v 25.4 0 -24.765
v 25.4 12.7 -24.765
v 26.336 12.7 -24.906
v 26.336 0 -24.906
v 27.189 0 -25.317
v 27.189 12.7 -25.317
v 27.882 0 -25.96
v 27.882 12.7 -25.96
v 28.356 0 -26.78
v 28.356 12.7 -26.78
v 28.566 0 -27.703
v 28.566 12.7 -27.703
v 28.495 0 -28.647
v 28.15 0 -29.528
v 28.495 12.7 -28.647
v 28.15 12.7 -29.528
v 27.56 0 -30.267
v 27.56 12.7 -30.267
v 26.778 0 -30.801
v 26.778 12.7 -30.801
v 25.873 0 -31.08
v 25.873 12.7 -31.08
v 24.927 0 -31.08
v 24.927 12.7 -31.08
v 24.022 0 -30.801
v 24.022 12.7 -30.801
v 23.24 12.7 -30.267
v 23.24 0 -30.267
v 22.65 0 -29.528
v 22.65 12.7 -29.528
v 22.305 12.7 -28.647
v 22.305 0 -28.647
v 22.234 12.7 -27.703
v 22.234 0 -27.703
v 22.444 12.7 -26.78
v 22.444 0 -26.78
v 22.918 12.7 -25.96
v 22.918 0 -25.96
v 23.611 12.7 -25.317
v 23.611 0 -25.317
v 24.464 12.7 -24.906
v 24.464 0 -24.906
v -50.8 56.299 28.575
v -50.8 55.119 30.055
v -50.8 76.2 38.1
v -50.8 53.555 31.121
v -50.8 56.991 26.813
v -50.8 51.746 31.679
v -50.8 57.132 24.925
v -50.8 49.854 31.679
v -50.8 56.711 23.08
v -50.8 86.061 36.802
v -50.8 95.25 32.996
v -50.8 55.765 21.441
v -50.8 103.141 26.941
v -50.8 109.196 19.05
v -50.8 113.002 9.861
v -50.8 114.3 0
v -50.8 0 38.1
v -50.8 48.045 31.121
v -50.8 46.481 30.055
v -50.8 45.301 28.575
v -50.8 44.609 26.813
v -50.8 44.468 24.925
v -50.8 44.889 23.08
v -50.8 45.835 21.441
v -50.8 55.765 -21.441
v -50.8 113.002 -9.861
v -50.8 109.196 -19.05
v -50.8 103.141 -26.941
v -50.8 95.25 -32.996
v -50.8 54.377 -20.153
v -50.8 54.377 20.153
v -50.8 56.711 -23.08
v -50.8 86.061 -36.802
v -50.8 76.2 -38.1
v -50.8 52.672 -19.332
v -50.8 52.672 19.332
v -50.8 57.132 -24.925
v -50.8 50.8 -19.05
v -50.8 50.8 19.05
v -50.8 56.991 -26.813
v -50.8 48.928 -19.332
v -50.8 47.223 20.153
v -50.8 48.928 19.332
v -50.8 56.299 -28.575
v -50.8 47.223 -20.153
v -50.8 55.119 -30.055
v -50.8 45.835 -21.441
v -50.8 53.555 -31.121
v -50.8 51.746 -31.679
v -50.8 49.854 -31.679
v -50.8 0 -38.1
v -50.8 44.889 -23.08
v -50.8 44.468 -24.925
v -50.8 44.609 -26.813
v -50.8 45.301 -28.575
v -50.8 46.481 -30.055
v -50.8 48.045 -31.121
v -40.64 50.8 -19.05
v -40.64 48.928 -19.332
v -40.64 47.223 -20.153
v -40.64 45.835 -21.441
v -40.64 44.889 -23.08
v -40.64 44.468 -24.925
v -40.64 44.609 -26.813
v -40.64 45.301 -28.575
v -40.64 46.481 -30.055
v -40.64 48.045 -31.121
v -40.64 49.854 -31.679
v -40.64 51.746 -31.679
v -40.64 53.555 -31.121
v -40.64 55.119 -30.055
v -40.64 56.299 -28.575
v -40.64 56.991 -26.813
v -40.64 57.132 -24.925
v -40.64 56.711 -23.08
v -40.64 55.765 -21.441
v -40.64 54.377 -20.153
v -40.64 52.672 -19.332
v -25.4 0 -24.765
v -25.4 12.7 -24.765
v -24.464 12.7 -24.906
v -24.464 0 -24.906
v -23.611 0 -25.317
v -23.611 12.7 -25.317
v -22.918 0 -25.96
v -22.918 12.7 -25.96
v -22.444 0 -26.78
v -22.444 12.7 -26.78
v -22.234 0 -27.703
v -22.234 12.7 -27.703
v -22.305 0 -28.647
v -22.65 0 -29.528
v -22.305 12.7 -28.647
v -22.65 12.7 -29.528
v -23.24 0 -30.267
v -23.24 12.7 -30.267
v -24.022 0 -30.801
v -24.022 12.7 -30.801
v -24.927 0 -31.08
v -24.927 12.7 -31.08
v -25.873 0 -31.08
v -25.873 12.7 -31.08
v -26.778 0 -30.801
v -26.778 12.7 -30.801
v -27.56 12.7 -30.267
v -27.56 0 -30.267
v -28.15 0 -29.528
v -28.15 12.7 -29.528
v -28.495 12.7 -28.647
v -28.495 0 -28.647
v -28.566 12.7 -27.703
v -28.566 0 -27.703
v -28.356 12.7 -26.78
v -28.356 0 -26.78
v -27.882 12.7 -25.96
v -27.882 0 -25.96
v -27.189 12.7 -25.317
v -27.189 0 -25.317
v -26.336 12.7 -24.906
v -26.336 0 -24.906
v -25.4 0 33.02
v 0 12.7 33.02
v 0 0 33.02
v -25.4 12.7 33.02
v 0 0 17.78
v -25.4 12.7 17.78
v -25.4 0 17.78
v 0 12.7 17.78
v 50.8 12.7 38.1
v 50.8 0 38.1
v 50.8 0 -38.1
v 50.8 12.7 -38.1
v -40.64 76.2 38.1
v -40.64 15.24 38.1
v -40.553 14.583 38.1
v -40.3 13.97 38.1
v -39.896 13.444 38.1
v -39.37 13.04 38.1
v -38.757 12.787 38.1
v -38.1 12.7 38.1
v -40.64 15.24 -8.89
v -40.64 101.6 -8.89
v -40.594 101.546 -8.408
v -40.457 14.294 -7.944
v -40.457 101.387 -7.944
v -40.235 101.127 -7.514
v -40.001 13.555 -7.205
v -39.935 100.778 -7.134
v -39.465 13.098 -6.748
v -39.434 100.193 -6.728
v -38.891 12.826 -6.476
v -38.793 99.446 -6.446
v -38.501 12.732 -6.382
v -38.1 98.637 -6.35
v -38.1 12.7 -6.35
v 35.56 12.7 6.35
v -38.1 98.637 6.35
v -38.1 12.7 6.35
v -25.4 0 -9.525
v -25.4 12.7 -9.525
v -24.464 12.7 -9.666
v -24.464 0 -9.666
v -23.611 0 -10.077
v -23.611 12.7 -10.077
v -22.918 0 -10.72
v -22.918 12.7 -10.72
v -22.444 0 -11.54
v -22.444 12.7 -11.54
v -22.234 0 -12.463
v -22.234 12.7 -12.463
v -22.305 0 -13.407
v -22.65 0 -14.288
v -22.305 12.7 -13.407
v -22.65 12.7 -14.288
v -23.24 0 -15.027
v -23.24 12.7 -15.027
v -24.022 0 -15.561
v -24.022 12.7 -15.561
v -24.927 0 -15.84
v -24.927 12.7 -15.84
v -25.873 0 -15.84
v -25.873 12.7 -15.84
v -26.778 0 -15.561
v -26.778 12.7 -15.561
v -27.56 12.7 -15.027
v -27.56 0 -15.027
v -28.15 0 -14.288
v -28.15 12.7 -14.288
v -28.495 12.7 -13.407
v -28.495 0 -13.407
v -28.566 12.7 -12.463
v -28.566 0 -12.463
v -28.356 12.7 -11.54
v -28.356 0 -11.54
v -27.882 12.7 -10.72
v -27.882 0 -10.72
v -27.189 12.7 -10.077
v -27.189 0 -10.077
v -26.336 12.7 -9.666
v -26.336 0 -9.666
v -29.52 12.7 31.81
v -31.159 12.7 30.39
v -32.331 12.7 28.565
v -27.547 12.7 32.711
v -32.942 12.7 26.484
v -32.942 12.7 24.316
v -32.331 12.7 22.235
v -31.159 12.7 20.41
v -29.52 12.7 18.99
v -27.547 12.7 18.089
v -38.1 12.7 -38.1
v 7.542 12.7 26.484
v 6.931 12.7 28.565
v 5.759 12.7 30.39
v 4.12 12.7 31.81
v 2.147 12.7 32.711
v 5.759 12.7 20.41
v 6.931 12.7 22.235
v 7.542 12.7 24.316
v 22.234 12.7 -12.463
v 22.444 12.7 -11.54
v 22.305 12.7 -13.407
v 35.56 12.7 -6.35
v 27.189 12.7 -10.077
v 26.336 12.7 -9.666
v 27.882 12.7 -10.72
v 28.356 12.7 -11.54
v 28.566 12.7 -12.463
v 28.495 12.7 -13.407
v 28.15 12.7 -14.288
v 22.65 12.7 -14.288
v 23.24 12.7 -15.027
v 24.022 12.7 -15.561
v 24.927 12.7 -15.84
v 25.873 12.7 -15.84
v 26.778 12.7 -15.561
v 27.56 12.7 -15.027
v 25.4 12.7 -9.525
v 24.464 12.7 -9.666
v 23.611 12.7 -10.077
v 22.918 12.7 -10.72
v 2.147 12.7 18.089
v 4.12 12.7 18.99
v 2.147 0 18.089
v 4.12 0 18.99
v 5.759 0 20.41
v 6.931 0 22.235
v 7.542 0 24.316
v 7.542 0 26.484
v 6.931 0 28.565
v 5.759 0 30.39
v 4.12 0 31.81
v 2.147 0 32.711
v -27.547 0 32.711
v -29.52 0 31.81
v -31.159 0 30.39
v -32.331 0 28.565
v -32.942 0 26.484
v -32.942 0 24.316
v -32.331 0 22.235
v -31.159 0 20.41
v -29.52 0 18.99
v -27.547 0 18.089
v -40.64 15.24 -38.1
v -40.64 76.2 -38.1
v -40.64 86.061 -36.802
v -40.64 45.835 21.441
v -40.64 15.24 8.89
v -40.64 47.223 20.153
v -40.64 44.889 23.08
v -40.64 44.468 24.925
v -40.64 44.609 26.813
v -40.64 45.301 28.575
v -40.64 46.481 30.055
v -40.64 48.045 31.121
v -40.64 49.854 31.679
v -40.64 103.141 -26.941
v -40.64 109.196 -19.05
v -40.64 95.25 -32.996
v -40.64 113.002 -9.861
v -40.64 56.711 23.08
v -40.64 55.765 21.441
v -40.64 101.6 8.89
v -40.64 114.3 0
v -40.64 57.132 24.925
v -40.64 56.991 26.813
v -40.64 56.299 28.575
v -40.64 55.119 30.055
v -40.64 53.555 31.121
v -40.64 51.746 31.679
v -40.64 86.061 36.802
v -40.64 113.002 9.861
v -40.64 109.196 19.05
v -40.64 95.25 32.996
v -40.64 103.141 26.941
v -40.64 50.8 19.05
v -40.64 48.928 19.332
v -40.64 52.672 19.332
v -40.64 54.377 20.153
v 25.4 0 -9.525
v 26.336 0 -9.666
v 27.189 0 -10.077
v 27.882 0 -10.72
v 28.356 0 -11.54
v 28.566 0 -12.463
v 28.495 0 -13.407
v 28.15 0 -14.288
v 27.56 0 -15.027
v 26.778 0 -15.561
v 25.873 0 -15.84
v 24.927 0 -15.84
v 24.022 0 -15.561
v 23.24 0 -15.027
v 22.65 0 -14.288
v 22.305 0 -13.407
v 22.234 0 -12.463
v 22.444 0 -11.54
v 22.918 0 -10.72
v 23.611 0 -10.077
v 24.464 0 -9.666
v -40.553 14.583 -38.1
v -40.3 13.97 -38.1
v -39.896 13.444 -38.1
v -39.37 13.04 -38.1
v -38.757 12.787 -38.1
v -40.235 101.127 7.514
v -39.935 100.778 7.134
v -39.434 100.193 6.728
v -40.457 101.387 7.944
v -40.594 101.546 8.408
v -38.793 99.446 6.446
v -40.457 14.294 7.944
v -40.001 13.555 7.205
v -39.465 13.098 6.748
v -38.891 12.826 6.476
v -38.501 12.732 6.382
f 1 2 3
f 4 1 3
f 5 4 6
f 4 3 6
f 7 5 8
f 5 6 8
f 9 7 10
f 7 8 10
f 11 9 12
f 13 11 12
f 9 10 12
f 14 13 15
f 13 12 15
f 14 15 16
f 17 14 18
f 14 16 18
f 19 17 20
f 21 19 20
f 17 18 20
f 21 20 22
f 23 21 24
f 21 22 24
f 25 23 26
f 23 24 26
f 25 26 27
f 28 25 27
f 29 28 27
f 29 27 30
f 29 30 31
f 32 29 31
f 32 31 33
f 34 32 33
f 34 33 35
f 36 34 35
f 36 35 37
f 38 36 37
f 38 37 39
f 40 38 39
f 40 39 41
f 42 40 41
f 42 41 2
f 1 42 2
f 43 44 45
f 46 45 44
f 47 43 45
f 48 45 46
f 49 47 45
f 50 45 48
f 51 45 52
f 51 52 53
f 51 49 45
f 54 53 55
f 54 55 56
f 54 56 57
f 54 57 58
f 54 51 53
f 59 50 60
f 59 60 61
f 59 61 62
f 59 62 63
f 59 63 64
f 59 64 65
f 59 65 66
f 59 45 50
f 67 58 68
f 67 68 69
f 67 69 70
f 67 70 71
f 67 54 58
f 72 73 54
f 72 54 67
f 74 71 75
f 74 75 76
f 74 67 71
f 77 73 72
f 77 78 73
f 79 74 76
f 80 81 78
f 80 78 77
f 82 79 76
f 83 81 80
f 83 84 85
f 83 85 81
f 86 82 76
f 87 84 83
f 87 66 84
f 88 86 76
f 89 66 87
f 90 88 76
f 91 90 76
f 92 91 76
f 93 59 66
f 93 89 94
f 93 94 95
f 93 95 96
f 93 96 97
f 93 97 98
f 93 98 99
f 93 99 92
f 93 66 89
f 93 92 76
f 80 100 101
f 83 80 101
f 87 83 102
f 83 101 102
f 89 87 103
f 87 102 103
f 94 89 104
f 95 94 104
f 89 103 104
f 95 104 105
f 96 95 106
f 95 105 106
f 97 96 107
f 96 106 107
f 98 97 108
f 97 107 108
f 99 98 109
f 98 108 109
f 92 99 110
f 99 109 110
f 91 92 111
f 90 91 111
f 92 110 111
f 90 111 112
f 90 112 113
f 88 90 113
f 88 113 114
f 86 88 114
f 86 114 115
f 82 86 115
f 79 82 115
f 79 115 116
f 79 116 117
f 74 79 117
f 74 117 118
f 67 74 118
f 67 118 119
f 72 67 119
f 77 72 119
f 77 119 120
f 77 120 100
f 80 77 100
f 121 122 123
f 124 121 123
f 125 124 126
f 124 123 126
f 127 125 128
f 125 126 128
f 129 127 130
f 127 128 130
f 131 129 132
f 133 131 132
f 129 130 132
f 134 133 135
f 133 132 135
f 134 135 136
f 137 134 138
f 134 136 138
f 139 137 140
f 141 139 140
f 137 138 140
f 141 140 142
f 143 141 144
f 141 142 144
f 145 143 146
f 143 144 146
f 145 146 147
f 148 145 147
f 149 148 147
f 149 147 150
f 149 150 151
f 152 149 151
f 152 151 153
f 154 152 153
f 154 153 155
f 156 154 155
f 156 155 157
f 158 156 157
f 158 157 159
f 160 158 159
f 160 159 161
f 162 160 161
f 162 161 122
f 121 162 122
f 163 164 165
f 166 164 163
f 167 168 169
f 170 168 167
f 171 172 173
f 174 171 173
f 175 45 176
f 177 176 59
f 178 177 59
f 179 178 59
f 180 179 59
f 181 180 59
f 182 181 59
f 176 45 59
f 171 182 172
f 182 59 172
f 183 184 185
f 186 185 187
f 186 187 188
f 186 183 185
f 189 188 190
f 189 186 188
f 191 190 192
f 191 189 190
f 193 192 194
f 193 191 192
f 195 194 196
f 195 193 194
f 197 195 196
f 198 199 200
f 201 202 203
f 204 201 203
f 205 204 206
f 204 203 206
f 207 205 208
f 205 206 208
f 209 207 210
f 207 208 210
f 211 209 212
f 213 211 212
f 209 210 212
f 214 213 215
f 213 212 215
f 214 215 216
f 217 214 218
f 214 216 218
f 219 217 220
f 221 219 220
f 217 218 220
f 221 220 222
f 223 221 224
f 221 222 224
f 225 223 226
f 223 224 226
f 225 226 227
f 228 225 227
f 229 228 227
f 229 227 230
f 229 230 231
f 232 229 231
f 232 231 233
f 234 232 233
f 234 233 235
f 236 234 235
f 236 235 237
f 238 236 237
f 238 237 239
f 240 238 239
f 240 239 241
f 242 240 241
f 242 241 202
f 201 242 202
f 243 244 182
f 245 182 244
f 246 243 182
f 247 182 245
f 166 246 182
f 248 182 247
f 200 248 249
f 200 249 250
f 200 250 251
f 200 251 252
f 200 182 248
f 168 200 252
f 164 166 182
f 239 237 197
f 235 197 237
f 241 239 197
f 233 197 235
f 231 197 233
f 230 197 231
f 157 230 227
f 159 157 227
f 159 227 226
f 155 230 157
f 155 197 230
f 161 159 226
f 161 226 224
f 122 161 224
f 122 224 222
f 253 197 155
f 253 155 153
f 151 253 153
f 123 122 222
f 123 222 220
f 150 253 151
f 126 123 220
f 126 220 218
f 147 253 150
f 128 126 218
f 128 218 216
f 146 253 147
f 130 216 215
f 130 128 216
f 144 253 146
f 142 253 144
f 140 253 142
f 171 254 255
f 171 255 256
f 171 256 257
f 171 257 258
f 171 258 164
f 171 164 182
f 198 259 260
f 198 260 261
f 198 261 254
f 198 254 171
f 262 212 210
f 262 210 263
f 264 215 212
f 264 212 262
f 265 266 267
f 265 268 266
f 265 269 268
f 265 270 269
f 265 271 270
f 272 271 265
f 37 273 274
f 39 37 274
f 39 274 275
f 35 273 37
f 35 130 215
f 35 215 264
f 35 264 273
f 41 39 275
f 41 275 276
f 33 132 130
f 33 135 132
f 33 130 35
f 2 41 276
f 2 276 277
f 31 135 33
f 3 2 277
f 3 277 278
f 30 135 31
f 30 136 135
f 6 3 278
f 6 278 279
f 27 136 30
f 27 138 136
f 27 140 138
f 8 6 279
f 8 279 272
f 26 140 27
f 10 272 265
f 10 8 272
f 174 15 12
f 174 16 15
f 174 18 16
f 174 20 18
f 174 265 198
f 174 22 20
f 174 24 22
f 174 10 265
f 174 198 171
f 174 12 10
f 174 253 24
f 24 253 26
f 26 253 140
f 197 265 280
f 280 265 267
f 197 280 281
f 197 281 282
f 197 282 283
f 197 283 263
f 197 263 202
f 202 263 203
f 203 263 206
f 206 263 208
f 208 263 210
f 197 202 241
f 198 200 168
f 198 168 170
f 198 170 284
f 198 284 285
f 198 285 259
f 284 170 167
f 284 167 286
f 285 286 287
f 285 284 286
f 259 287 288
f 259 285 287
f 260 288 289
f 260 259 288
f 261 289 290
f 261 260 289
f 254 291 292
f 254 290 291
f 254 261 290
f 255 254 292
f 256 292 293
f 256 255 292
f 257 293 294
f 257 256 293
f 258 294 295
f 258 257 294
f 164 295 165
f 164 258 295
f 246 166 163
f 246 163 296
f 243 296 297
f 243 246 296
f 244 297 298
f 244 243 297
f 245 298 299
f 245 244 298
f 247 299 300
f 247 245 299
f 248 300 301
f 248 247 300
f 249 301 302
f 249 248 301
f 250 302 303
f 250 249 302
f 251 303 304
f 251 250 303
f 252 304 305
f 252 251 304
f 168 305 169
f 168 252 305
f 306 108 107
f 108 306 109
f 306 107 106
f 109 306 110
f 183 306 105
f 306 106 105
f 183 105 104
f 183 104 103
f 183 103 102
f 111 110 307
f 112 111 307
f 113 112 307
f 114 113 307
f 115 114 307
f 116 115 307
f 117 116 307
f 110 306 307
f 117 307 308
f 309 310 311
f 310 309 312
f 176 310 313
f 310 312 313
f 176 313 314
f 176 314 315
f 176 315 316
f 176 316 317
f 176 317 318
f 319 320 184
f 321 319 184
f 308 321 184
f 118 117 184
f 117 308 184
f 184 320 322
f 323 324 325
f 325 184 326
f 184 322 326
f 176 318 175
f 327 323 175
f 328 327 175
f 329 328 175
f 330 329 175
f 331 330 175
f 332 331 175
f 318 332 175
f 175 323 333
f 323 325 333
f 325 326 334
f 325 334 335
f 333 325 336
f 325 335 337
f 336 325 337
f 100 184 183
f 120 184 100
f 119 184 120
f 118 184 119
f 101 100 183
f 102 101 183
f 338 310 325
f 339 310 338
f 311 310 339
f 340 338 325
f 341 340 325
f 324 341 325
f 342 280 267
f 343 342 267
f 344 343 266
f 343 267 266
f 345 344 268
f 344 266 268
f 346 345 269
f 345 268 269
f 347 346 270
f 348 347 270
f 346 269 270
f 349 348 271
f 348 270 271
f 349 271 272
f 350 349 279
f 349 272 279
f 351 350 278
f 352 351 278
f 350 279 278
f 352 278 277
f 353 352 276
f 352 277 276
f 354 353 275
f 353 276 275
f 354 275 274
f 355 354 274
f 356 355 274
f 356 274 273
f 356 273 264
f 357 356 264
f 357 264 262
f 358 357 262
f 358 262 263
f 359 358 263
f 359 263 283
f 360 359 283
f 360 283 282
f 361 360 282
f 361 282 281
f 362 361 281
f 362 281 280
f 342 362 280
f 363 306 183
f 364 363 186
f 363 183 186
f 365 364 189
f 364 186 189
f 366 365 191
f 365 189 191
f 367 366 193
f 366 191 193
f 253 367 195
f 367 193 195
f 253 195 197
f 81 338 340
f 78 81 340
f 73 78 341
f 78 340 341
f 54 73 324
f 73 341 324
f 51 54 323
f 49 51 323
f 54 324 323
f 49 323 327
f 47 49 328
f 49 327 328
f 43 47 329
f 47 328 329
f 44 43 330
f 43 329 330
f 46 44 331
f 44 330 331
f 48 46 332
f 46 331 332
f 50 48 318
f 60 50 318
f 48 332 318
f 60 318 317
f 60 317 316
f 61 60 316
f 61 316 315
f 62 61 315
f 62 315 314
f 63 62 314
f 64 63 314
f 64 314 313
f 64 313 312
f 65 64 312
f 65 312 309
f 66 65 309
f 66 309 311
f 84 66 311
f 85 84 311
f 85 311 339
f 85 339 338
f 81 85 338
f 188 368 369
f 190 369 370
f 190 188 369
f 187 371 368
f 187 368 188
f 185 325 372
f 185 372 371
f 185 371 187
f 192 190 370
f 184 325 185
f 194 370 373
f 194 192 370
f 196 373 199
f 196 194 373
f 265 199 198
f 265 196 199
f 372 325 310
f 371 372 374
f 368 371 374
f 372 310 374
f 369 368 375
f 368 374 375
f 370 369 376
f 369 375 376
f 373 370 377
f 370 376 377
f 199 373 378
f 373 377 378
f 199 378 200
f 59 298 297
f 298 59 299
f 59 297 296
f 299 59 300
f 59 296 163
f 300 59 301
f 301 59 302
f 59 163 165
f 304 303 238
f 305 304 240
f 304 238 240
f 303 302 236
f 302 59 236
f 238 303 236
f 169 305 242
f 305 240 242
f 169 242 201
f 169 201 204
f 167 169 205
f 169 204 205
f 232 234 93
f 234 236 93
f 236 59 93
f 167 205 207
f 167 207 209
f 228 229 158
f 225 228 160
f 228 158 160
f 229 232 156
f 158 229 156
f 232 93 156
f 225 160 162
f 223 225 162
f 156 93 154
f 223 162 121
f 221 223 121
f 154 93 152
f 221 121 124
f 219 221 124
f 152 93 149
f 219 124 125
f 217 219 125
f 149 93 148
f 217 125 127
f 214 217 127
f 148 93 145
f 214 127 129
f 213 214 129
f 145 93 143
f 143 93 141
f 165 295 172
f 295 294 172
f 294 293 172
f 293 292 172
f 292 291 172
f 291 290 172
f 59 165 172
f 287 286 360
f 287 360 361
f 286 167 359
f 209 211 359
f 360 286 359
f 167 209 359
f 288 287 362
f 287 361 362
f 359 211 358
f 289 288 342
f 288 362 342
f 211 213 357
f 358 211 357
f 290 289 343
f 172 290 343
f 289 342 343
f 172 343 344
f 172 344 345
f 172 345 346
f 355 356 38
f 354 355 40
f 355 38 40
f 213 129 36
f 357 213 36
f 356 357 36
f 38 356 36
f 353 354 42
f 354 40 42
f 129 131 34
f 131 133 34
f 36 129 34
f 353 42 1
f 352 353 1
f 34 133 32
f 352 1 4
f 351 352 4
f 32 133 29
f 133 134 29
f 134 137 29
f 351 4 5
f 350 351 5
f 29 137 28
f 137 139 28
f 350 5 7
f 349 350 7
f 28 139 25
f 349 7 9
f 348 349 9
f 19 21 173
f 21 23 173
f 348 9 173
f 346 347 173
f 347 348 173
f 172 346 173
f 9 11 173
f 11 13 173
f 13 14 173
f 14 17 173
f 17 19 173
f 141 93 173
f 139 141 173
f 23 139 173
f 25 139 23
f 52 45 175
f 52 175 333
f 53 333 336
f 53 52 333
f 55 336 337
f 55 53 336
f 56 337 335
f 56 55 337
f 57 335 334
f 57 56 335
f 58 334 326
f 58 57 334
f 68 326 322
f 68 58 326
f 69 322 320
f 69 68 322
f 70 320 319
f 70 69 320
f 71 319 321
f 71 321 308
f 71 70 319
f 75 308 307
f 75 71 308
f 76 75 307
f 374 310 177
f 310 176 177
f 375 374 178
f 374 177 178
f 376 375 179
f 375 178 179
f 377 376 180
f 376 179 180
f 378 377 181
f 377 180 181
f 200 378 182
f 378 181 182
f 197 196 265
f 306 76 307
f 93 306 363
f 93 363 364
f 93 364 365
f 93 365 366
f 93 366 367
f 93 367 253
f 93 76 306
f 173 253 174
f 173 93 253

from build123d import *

# Parameters (mm, degrees)
SKETCH1_W           = 101.6
SKETCH1_H           = 76.2
BOSS_EXTRUDE4_DEPTH = 12.7
BOSS_EXTRUDE5_DEPTH = 10.16
SKETCH5_R           = 3.175
CUT_EXTRUDE1_DEPTH  = 120.811560377
SKETCH6_R           = 6.35
CUT_EXTRUDE2_DEPTH  = 152.252681299
RIB1_REACH          = 132.755
SKETCH7_WALL_W      = 380.597220188
SKETCH7_WALL_H      = 12.7
FILLET2_R           = 2.54


with BuildPart() as part:
    # Sketch1 → Boss-Extrude4 (new body)
    with BuildSketch(Plane(origin=(0, 0, 0), x_dir=(1, 0, 0), z_dir=(0, 1, 0))):
        Rectangle(SKETCH1_W, SKETCH1_H)
    extrude(amount=BOSS_EXTRUDE4_DEPTH)

    # Sketch4 → Boss-Extrude5 (add)
    with BuildSketch(Plane.ZY.offset(50.8)):
        with BuildLine():
            Line((38.1, 0), (38.1, 76.2))
            ThreePointArc((38.1, 76.2), (0, 114.3), (-38.1, 76.2))
            Line((-38.1, 76.2), (-38.1, 0))
            Line((-38.1, 0), (38.1, 0))
        make_face()
    extrude(amount=-BOSS_EXTRUDE5_DEPTH)

    # Sketch5 → Cut-Extrude1 (cut, through all)
    with BuildSketch(Plane(origin=(0, 12.7, 0), x_dir=(1, 0, 0), z_dir=(0, 1, 0))):
        with Locations(Location((-25.4, 27.94, 0), (0, 0, 270))):
            Circle(SKETCH5_R)
        with Locations(Location((25.4, 27.94, 0), (0, 0, 270))):
            Circle(SKETCH5_R)
        with Locations(Location((25.4, 12.7, 0), (0, 0, 270))):
            Circle(SKETCH5_R)
        with Locations(Location((-25.4, 12.7, 0), (0, 0, 270))):
            Circle(SKETCH5_R)
        with BuildLine():
            Line((-25.4, -17.78), (0, -17.78))
            ThreePointArc((0, -17.78), (7.62, -25.4), (0, -33.02))
            Line((0, -33.02), (-25.4, -33.02))
            ThreePointArc((-25.4, -33.02), (-33.02, -25.4), (-25.4, -17.78))
        make_face()
    extrude(amount=-CUT_EXTRUDE1_DEPTH, mode=Mode.SUBTRACT)

    # Sketch6 → Cut-Extrude2 (cut, through all)
    with BuildSketch(Plane(origin=(-40.64, 0, 0), x_dir=(0, 0, -1), z_dir=(1, 0, 0))):
        with Locations((-25.4, 50.8)):
            Circle(SKETCH6_R)
        with Locations(Location((25.4, 50.8, 0), (0, 0, 180))):
            Circle(SKETCH6_R)
    extrude(amount=-CUT_EXTRUDE2_DEPTH, mode=Mode.SUBTRACT)

    # Sketch7 wall → Rib1 (add, up to next)
    with BuildSketch(Plane(origin=(-2.54, 57.15, 0), x_dir=(0.650791373456, -0.759256602365, 0), z_dir=(0.759256602365, 0.650791373456, 0)), mode=Mode.PRIVATE) as rib1_sk1:
        Rectangle(SKETCH7_WALL_W, SKETCH7_WALL_H)
    rib1_tool1 = extrude(rib1_sk1.sketch, amount=-RIB1_REACH, mode=Mode.PRIVATE) - part.part
    add(rib1_tool1.solids().sort_by_distance((-2.54, 57.15, 0))[0])

    # Fillet2
    fillet2_edges = [part.edges().sort_by_distance(p)[0] for p in [
        (-40.64, 12.7, 22.225),
        (-40.64, 12.7, -22.225),
        (-40.64, 57.15, -6.35),
        (-40.64, 57.15, 6.35),
    ]]
    fillet(fillet2_edges, radius=FILLET2_R)


solid = part.part
